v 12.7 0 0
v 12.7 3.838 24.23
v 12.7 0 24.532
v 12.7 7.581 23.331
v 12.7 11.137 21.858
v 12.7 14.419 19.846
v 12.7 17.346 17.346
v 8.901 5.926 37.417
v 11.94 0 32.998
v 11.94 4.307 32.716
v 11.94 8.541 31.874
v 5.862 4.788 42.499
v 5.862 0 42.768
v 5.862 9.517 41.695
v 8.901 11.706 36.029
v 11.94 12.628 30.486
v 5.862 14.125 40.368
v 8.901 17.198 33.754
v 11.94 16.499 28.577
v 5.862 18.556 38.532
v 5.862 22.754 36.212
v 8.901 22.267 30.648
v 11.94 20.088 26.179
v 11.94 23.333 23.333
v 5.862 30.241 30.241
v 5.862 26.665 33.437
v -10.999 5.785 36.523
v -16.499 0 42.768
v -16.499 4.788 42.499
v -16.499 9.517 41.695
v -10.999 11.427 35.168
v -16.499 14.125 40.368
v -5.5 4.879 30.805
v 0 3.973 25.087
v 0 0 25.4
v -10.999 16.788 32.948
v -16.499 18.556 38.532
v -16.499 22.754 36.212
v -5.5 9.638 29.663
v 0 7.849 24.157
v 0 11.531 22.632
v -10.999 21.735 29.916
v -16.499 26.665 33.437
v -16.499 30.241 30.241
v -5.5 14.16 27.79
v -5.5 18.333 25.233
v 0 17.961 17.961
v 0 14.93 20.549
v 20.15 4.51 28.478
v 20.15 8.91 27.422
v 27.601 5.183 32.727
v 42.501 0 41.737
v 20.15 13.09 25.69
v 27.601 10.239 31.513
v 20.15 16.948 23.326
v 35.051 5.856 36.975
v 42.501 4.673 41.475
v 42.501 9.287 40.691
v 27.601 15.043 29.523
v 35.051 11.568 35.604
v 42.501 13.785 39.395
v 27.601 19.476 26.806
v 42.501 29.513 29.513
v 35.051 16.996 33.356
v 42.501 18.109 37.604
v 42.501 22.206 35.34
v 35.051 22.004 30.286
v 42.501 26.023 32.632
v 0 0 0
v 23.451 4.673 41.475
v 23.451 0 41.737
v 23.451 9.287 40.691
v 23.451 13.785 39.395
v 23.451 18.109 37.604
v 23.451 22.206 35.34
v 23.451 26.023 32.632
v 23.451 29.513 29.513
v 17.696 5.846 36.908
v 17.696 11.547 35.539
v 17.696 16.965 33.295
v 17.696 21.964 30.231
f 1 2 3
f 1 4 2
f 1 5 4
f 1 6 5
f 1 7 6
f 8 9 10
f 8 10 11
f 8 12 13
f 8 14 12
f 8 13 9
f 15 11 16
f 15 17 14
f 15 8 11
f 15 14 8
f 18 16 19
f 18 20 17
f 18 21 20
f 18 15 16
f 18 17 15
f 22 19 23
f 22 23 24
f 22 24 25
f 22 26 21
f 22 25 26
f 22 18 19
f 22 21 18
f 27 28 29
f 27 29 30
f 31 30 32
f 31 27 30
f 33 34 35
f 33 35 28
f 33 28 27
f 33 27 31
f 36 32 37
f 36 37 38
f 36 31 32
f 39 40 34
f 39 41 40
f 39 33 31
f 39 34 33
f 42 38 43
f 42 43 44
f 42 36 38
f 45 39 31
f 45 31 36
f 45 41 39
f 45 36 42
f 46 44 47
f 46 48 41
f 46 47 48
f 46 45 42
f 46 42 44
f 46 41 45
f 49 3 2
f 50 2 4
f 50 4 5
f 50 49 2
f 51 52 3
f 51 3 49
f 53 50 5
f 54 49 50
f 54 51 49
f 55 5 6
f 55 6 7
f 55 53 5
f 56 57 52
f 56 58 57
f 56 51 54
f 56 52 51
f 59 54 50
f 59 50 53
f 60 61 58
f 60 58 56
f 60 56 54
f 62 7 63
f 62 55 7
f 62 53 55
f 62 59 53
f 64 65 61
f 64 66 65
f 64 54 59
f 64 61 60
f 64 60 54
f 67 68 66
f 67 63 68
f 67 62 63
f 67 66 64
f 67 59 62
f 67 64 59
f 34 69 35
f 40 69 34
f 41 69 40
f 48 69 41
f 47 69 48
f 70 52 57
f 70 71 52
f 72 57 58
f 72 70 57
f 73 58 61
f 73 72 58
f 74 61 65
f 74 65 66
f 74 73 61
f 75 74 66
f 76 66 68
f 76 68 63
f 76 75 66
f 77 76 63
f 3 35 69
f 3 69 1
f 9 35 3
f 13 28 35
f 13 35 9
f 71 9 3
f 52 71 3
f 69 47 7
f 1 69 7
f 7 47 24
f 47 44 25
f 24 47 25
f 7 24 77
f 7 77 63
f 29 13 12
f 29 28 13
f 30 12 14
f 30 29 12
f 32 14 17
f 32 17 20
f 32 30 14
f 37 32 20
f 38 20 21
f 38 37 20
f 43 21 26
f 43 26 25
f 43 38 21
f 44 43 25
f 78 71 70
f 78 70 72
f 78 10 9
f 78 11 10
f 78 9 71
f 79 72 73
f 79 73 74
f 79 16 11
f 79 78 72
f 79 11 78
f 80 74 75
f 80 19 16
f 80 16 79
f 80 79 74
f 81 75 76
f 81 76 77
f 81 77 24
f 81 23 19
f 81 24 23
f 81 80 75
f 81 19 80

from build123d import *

# Parameters (mm, degrees)
F1_ANGLE = 45


with BuildPart() as f1:
    # F0 (on Front) → F1 (revolve)
    with BuildSketch(Plane.XZ):
        Polygon((0, 25.4), (0, 0), (12.7, 0), (12.7, 24.531622), (42.501195, 41.73735), (23.451195, 41.73735), (11.940171, 32.998289), (5.861538, 42.767522), (-16.499144, 42.767522), align=None)
    revolve(axis=Axis((6.35, 0, 0), (-1, 0, 0)), revolution_arc=F1_ANGLE)


solid = f1.part
